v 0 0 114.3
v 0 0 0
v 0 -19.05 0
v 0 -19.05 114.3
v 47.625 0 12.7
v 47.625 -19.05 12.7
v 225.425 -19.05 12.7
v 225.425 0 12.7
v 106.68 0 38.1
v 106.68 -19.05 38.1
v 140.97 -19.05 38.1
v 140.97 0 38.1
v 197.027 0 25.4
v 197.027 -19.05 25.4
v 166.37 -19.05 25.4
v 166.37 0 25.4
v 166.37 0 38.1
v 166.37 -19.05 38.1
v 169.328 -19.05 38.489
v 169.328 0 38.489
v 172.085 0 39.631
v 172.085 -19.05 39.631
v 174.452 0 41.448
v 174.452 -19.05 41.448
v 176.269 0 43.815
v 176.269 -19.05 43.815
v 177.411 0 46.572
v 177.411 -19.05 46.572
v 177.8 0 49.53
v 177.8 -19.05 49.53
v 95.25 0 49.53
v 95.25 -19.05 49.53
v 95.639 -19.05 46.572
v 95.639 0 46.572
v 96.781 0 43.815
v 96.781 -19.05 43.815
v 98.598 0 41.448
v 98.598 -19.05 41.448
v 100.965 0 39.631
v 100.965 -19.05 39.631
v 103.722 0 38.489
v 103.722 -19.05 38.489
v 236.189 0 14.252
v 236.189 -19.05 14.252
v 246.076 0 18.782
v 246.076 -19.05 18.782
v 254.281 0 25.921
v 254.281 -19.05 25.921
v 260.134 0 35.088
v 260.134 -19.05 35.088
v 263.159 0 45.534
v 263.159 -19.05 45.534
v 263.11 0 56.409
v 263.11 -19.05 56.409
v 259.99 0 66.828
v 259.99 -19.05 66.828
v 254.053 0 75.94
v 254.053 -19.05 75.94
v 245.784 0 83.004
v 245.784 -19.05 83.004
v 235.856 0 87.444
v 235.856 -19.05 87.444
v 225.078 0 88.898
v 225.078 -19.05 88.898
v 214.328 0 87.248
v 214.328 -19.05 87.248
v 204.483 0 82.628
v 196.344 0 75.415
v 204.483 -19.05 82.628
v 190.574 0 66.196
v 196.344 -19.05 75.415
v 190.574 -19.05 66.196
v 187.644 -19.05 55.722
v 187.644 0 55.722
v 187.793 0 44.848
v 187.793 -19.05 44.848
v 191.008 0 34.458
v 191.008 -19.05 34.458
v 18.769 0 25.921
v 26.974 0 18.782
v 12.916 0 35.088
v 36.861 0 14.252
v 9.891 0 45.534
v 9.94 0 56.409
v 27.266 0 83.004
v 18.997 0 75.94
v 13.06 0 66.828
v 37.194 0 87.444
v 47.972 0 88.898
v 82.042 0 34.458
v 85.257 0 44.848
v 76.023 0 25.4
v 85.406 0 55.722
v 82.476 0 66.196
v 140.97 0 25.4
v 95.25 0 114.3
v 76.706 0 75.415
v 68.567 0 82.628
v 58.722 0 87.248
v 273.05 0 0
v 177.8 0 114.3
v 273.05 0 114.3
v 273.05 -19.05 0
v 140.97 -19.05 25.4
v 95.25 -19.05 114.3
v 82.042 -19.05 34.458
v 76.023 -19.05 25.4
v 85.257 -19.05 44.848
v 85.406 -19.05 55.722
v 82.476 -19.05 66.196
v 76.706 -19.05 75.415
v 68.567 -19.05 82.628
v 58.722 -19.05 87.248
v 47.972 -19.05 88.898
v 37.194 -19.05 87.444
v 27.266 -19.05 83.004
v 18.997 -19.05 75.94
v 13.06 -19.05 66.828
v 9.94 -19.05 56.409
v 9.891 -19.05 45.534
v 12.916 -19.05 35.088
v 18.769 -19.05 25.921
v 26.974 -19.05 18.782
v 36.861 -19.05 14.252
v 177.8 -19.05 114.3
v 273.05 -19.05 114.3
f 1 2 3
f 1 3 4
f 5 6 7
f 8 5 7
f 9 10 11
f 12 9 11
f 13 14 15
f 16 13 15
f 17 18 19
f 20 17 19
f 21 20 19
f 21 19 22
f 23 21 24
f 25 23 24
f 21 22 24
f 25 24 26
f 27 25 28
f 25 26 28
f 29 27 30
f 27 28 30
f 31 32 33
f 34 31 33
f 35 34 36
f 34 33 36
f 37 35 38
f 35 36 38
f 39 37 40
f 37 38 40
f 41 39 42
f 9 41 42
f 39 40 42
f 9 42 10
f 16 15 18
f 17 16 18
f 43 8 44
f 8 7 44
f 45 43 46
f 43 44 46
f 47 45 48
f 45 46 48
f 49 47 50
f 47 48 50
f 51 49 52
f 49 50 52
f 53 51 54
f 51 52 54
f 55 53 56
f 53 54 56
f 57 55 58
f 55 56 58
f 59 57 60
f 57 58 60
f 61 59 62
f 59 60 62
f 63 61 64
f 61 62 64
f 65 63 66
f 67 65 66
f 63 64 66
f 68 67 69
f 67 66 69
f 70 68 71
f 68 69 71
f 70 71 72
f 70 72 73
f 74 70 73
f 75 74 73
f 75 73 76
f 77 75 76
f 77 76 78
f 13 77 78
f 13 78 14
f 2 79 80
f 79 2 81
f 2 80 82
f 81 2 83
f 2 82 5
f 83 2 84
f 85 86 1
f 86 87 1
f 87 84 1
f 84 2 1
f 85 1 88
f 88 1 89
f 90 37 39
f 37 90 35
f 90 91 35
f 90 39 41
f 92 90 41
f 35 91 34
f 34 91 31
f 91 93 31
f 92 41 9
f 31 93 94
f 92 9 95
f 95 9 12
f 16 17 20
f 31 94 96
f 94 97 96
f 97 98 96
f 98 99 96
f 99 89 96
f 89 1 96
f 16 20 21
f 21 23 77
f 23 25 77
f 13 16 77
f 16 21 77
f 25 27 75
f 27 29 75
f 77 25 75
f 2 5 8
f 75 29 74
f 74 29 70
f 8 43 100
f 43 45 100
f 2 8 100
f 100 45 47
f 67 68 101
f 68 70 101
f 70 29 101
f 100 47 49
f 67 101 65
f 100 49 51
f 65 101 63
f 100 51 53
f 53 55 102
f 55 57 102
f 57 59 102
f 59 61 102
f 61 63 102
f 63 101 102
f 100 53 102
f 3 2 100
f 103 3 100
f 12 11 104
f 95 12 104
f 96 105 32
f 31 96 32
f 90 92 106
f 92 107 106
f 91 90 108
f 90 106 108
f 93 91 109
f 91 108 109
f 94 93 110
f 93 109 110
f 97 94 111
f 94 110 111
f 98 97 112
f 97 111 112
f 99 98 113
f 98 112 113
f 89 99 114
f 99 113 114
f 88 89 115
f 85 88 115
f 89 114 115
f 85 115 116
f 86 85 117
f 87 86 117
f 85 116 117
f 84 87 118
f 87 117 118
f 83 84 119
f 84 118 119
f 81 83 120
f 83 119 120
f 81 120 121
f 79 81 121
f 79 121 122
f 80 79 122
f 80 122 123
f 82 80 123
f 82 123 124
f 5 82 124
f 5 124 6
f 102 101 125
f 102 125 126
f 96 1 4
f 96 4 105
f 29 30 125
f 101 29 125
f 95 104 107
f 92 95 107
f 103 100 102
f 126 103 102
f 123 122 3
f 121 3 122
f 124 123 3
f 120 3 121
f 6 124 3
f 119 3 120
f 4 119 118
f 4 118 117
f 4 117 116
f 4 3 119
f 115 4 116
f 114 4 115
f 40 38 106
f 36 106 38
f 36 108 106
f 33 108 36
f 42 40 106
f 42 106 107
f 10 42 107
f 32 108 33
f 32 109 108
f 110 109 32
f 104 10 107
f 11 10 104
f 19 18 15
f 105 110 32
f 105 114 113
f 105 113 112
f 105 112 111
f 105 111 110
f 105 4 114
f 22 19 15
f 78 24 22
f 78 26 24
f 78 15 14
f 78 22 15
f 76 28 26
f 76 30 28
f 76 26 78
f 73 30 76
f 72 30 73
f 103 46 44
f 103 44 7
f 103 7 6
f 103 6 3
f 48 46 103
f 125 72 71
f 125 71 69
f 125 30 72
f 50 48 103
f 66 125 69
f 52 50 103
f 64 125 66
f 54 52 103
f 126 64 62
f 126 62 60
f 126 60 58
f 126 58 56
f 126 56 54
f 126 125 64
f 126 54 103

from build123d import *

# Parameters (mm, degrees)
F0_W     = 273.05
F0_H     = 114.3
F1_DEPTH = 19.05
F2_R     = 38.1
F3_DEPTH = 25.4
F5_DEPTH = 25.4
F7_DEPTH = 25.4


with BuildPart() as f1:
    # F0 (on Front) → F1 (new body)
    with BuildSketch(Plane.XZ):
        with Locations((136.525, 57.15)):
            Rectangle(F0_W, F0_H)
    extrude(amount=F1_DEPTH)

    # F2 (on face) → F3 (cut)
    with BuildSketch(Plane.XZ.offset(19.05)):
        with Locations((47.625, 50.8)):
            Circle(F2_R)
        with Locations((225.425, 50.8)):
            Circle(F2_R)
    extrude(amount=-F3_DEPTH, mode=Mode.SUBTRACT)

    # F4 (on face) → F5 (cut)
    with BuildSketch(Plane.XZ.offset(19.05)):
        with BuildLine():
            Line((177.8, 114.3), (95.25, 114.3))
            Line((95.25, 114.3), (95.25, 49.53))
            ThreePointArc((95.25, 49.53), (98.597769491, 41.447769491), (106.68, 38.1))
            Line((106.68, 38.1), (166.37, 38.1))
            ThreePointArc((166.37, 38.1), (174.452230509, 41.447769491), (177.8, 49.53))
            Line((177.8, 49.53), (177.8, 114.3))
        make_face()
    extrude(amount=-F5_DEPTH, mode=Mode.SUBTRACT)

    # F6 (on face) → F7 (cut)
    with BuildSketch(Plane.XZ.offset(19.05)):
        with BuildLine():
            Line((166.37, 38.1), (140.97, 38.1))
            Line((140.97, 38.1), (140.97, 25.4))
            Line((140.97, 25.4), (76.0230633142, 25.4))
            ThreePointArc((76.0230633142, 25.4), (63.1792598667, 16.0196175984), (47.625, 12.7))
            Line((47.625, 12.7), (225.425, 12.7))
            ThreePointArc((225.425, 12.7), (209.8707401333, 16.0196175984), (197.0269366858, 25.4))
            Line((197.0269366858, 25.4), (166.37, 25.4))
            Line((166.37, 25.4), (166.37, 38.1))
        make_face()
    extrude(amount=-F7_DEPTH, mode=Mode.SUBTRACT)


solid = f1.part
